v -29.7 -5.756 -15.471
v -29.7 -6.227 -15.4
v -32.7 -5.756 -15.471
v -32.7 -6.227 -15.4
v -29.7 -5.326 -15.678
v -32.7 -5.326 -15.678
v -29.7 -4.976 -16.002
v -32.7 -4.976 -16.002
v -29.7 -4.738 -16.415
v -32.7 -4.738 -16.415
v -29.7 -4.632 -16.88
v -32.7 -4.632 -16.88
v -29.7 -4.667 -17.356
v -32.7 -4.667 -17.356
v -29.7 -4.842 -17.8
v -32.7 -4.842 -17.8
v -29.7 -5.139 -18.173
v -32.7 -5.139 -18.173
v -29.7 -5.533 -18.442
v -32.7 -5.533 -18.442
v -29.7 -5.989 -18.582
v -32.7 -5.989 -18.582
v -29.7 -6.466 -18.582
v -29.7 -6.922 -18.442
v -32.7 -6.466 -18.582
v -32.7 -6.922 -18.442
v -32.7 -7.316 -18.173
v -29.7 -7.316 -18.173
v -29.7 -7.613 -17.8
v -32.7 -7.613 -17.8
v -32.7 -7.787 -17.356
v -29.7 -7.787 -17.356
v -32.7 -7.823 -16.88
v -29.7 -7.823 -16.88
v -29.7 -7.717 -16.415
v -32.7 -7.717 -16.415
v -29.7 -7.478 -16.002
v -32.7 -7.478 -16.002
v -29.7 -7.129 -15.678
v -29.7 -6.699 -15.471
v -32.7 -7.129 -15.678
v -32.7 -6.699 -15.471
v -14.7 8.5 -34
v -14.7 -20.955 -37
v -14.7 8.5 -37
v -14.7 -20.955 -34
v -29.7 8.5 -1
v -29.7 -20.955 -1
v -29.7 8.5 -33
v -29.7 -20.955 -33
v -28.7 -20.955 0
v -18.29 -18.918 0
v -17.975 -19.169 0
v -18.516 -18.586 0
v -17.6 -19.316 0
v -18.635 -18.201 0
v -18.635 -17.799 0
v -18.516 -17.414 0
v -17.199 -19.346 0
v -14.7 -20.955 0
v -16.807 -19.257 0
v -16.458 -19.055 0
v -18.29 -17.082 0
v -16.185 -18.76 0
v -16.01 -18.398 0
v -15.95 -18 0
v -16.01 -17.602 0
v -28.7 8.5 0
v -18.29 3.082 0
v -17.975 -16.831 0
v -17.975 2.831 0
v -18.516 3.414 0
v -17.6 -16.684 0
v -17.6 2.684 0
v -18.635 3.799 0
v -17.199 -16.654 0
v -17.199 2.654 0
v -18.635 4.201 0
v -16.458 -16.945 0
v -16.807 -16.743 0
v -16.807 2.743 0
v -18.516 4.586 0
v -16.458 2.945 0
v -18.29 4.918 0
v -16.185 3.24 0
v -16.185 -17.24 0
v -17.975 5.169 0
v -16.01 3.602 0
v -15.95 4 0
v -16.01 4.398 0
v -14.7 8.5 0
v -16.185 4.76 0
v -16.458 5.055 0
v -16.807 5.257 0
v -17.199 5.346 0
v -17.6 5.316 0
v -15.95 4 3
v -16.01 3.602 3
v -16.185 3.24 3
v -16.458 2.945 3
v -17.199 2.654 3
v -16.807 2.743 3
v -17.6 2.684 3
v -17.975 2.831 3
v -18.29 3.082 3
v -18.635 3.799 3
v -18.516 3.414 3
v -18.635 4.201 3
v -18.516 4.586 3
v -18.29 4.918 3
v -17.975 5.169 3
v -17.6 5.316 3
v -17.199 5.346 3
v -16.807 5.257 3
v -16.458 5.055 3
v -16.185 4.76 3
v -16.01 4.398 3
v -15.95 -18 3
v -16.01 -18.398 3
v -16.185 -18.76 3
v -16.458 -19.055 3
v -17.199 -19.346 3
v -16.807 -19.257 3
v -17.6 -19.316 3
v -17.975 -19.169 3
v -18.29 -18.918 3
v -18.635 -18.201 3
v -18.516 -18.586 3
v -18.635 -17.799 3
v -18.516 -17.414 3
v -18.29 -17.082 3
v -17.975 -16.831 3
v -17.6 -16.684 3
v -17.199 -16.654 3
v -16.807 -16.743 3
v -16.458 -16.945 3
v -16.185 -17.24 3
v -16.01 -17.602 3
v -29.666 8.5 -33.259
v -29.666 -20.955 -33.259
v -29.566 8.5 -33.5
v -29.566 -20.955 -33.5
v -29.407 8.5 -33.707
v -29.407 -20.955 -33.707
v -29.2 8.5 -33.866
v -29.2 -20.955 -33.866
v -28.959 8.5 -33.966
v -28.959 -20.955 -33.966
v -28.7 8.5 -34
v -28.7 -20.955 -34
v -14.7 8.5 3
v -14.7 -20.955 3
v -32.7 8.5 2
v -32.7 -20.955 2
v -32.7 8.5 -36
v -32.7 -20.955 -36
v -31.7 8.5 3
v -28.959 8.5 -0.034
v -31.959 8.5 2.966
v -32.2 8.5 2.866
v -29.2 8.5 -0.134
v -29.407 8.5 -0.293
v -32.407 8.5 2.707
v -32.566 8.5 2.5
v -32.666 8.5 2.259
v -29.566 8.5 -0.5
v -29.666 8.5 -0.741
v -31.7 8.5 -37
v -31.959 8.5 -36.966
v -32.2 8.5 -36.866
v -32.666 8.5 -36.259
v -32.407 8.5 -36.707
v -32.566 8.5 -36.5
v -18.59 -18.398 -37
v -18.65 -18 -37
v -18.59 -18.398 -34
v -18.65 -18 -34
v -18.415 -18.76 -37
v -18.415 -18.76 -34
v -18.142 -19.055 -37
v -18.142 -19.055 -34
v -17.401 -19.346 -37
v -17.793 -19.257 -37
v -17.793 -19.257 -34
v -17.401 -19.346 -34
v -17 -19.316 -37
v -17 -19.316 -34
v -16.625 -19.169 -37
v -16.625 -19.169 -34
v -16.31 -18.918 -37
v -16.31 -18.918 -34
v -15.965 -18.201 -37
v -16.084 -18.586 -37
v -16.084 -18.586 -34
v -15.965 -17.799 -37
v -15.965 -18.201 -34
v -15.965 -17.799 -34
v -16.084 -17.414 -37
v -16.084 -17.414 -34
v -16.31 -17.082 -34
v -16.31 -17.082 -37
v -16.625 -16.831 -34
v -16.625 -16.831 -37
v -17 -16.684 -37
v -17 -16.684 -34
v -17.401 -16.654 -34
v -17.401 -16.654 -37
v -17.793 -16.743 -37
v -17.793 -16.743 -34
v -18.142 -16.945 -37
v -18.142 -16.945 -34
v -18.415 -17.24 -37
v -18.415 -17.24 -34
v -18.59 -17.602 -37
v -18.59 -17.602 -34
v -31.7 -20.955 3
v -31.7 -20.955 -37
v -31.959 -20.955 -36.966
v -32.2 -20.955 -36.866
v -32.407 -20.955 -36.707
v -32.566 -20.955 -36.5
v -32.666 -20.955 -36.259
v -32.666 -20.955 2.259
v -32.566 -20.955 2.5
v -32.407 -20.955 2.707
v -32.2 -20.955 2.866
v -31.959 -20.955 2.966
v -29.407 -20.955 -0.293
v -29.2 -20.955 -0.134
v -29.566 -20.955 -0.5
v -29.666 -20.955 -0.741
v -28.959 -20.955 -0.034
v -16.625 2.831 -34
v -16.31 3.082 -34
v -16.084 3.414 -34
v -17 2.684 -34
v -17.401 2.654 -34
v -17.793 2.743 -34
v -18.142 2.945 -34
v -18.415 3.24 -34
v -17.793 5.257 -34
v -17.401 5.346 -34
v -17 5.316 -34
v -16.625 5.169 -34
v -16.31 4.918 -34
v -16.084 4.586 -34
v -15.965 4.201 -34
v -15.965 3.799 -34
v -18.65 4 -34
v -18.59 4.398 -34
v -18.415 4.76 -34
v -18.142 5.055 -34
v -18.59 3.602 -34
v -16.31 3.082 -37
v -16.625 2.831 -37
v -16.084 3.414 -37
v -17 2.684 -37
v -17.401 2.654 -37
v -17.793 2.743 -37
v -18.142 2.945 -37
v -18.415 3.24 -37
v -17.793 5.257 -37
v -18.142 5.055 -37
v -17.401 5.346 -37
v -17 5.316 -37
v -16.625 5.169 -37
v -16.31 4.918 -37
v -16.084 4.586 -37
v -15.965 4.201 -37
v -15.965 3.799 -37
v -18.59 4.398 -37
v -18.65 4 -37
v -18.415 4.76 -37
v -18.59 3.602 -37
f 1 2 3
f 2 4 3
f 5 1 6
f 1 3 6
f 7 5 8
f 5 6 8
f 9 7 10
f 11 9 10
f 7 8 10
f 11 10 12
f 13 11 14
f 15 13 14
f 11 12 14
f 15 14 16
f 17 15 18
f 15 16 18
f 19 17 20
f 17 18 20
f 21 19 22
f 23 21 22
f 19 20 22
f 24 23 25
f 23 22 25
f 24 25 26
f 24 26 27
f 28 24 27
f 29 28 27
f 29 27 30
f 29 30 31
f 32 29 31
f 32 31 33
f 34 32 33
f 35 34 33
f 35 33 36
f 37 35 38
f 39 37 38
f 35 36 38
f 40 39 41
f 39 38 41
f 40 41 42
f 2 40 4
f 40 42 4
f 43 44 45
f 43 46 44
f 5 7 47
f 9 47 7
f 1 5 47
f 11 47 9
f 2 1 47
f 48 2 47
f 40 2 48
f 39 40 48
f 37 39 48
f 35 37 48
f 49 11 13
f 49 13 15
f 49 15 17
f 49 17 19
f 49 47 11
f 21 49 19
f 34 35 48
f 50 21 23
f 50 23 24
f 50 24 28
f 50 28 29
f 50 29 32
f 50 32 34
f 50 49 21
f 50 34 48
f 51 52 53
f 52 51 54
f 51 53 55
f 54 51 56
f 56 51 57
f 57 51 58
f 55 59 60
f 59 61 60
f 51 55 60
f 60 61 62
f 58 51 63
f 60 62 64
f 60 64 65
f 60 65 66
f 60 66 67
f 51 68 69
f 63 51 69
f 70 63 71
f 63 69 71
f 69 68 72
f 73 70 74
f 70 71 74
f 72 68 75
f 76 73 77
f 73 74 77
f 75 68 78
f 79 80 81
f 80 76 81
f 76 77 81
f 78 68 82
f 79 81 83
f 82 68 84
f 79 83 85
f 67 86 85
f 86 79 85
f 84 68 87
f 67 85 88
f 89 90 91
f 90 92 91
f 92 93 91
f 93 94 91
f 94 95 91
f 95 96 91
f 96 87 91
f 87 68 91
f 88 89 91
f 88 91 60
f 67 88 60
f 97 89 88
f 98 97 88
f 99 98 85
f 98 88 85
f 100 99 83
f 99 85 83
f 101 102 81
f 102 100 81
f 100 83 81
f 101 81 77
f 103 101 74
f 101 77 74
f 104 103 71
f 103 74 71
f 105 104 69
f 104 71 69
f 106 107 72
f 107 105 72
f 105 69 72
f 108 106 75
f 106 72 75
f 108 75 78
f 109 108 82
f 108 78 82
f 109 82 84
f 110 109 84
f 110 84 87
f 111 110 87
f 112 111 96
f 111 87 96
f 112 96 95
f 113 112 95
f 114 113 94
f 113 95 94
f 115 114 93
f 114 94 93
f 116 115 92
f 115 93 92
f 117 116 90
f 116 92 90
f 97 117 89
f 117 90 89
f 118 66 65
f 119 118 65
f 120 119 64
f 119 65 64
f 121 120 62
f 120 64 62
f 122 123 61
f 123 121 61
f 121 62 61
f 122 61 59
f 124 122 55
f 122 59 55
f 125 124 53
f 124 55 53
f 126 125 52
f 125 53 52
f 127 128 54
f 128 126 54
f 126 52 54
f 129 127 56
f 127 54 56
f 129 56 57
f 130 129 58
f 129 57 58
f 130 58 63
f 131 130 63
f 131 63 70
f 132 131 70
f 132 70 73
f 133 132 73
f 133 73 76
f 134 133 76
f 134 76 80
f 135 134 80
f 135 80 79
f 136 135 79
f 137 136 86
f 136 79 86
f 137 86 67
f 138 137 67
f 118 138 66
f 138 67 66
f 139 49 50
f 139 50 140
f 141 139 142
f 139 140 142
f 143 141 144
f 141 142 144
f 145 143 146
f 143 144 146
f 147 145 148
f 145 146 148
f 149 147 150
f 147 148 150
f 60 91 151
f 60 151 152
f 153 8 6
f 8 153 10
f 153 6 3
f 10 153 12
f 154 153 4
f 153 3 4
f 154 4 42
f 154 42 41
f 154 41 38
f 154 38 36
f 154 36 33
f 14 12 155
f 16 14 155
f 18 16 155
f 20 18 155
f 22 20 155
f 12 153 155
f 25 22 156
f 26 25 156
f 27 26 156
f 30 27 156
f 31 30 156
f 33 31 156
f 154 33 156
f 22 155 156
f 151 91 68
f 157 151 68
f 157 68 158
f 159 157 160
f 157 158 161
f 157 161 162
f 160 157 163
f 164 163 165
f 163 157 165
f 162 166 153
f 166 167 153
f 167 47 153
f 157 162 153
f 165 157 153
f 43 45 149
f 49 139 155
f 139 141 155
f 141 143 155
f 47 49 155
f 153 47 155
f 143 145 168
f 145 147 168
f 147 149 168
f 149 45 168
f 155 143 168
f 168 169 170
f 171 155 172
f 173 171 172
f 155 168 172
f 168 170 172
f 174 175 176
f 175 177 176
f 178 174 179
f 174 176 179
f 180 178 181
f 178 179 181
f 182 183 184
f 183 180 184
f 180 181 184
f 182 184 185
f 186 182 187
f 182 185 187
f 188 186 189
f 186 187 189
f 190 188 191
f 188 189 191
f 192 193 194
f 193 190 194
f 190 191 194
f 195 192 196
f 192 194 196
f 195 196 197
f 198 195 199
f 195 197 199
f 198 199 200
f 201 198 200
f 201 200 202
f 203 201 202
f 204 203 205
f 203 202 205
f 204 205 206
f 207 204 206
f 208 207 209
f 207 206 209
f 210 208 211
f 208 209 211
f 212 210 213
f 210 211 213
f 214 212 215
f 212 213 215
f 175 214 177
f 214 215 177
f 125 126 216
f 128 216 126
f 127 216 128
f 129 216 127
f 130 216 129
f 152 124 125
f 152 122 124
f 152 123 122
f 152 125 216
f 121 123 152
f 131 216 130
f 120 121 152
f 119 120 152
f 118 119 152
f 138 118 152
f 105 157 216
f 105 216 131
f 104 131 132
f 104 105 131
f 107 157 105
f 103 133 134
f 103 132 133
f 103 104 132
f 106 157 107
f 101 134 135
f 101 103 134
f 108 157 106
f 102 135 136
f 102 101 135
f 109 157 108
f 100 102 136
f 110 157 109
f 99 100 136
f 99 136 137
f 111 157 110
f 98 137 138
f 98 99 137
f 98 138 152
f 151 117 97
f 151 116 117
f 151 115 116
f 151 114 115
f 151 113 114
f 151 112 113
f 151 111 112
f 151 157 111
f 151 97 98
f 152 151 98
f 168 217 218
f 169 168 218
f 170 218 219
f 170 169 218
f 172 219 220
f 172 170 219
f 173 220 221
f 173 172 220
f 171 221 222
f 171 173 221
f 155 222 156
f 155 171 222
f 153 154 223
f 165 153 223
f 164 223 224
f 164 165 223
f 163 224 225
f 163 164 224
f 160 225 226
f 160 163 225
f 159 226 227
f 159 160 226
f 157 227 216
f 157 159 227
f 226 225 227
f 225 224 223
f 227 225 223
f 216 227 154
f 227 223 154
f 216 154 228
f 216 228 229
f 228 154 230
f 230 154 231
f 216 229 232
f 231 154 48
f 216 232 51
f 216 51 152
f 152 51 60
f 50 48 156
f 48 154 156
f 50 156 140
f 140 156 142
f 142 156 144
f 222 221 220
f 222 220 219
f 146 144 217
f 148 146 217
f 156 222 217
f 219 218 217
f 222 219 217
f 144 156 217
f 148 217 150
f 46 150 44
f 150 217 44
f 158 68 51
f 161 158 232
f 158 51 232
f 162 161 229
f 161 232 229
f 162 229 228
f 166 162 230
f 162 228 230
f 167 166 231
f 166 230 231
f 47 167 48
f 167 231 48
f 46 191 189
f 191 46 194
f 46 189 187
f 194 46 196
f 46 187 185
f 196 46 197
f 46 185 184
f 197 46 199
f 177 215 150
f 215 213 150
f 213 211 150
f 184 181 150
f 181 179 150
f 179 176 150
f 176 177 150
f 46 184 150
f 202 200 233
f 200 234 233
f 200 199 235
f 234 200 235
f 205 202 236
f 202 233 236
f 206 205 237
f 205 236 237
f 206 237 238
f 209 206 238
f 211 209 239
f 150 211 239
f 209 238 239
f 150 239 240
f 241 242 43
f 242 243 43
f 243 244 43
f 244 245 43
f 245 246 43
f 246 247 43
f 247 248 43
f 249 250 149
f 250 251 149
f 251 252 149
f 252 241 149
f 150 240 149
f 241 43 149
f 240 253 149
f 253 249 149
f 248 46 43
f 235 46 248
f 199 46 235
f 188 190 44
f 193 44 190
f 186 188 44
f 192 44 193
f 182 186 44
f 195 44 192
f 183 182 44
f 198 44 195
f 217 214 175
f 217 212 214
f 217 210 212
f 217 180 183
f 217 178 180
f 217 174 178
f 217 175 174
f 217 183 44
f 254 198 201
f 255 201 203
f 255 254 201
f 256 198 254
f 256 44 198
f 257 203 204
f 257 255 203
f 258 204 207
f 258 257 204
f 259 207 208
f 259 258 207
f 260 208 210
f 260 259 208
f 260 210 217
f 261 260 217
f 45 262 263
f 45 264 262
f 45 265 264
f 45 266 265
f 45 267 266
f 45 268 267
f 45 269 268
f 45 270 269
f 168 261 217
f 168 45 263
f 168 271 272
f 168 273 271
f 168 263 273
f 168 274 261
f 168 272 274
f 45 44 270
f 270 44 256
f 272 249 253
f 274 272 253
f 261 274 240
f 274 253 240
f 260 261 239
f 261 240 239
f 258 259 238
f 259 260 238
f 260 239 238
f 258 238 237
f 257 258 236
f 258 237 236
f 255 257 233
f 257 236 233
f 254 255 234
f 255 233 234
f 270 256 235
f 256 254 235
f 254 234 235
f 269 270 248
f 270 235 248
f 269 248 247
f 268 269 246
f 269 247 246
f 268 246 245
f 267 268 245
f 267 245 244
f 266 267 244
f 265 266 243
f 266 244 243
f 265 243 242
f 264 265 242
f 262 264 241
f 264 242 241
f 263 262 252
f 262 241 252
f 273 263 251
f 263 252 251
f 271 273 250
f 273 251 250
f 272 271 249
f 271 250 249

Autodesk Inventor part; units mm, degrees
ref_plane "YZ Plane" through (0, 0, 0) normal (1, 0, 0) x (0, 1, 0)
ref_plane "XZ Plane" through (0, 0, 0) normal (0, 1, 0) x (-1, 0, 0)
ref_plane "XY Plane" through (0, 0, 0) normal (0, 0, 1) x (1, 0, 0)
ref_plane "작업 평면1" through (0, 0, -34) normal (0, 0, -1) x (-1, 0, 0)
sketch "스케치1" plane through (0, 0, -34) normal (0, 0, -1) x (-1, 0, 0)
  circle A0 centre (17.3, -18) radius 1.35 projected
  line L0 (20.1, -44.6) -> (20.1, 8.5) projected
  line L1 (14.5, -42) -> (14.5, 11.5) projected
  circle A1 centre (17.3, 4) radius 1.35 projected
  circle A2 centre (17.3, -18) radius 1.45
  circle A3 centre (17.3, 4) radius 1.45
  line L2 (14.7, -42) -> (14.7, 11.5)
  line L3 (14.7, 11.5) -> (20.1, 8.5)
  line L4 (14.7, -20.9546) -> (32.7, -20.9546)
  line L5 (32.7, -20.9546) -> (32.7, 8.5)
  line L6 (32.7, 8.5) -> (20.1, 8.5)
  line L7 (32.7, -20.9546) -> (26.7, -20.9546)
  line L8 (26.7, -20.9546) -> (26.7, 8.5)
  line L9 (26.7, 8.5) -> (32.7, 8.5)
  line L10 (32.7, 8.5) -> (32.7, -20.9546)
  line L11 (20.1, 8.5) -> (14.7, 8.5)
  point P0 (0, 0)
  dimension "d0" = 0.1
  dimension "d1" = 0.1
  dimension "d2" = 0.2
  dimension "d3" = 18
  dimension "d8" = 6
extrude "돌출1" add sketch "스케치1" along normal blind 3 contours L4 L2 L11 L0 | L0 L6 L8 L4 | L8 L6 L5 L4 | A2 | A3
sketch "스케치2" plane through (0, 0, -34) normal (0, 0, 1) x (1, 0, 0)
  line L0 (-20.1, 8.5) -> (-14.7, 11.5) projected
  line L1 (-14.7, 8.5) -> (-14.7, -20.9546) projected
  line L2 (-20.1, -44.6) -> (-20.1, 8.5) projected
  line L3 (-32.7, 8.5) -> (-14.7, 8.5) projected
  line L4 (-32.7, -20.9546) -> (-32.7, 8.5) projected
  line L5 (-14.7, -20.9546) -> (-32.7, -20.9546) projected
  line L6 (-20.1, -20.9546) -> (-32.7, -20.9546)
  line L7 (-32.7, -20.9546) -> (-32.7, 8.5)
  line L8 (-32.7, 8.5) -> (-20.1, 8.5)
  line L9 (-20.1, 8.5) -> (-20.1, -20.9546)
  line L10 (-20.1, -20.9546) -> (-14.7, -20.9546)
  line L11 (-14.7, 11.5) -> (-20.1, 8.5)
  circle A0 centre (-17.3, -18) radius 1.45 projected
  circle A1 centre (-17.3, 4) radius 1.35 projected
  circle A2 centre (-17.3, 4) radius 1.45 projected
  circle A3 centre (-17.3, 4) radius 1.45
  circle A4 centre (-17.3, -18) radius 1.45
  point P0 (0, 0)
ref_plane "작업 평면2" through (0, 0, 0) normal (0, 0, 1) x (1, 0, 0)
sketch "스케치3" plane through (0, 0, 0) normal (0, 0, 1) x (1, 0, 0)
  line L0 (-32.7, 8.5) -> (-14.7, 8.5) projected
  line L1 (-32.7, -20.9546) -> (-32.7, 8.5) projected
  line L2 (-14.7, -20.9546) -> (-32.7, -20.9546) projected
  line L3 (-14.7, 8.5) -> (-14.7, -20.9546) projected
  line L4 (-20.1, -20.9546) -> (-32.7, -20.9546)
  line L5 (-32.7, -20.9546) -> (-32.7, 8.5)
  line L6 (-32.7, 8.5) -> (-20.1, 8.5)
  line L7 (-20.1, 8.5) -> (-20.1, -20.9546)
  line L8 (-32.7, -20.9546) -> (-20.1, -20.9546)
  line L9 (-20.1, -20.9546) -> (-20.1, 8.5)
  line L10 (-20.1, 8.5) -> (-32.7, 8.5)
  line L11 (-32.7, 8.5) -> (-32.7, -20.9546)
  line L12 (-20.1, -20.9546) -> (-14.7, -20.9546)
  line L13 (-14.7, 8.5) -> (-14.7, -20.9546) projected
  line L14 (-14.7, 11.5) -> (-20.1, 8.5)
  circle A0 centre (-17.3, -18) radius 1.45
  circle A1 centre (-17.3, 4) radius 1.45
  circle A2 centre (-17.3, 4) radius 1.35 projected
  circle A3 centre (-17.3, 4) radius 1.35
  circle A4 centre (-17.3, -18) radius 1.35
  point P0 (0, 0)
  dimension "d25" = 2.7
  dimension "d26" = 2.7
extrude "돌출2" add sketch "스케치3" along normal blind 3 contours L0 L7 L2 L1 | L0 L3 L2 L7 | A0 | A1
sketch "스케치4" plane through (0, 0, -34) normal (0, 0, 1) x (1, 0, 0)
  line L0 (-14.7, -20.9546) -> (-14.7, 8.5) projected
  line L1 (-14.7, 8.5) -> (-32.7, 8.5) projected
  line L2 (-32.7, 8.5) -> (-32.7, -20.9546) projected
  line L3 (-32.7, -20.9546) -> (-14.7, -20.9546) projected
  line L4 (-32.7, 8.5) -> (-26.7, 8.5)
  line L5 (-26.7, -20.9546) -> (-32.7, -20.9546)
  line L6 (-32.7, -20.9546) -> (-32.7, 8.5)
  line L7 (-32.7, 8.5) -> (-29.7, 8.5)
  line L8 (-29.7, 8.5) -> (-29.7, -20.9546)
  line L9 (-29.7, -20.9546) -> (-32.7, -20.9546)
  line L10 (-32.7, -20.9546) -> (-32.7, 8.5)
  point P0 (0, 0)
  point P1 (-29.7, -20.9546)
  dimension "d9" = 6
  dimension "d23" = 3
extrude "돌출3" add sketch "스케치4" along normal up to surface (34 mm away) contours L3 L2 L1 L8
sketch "스케치6" plane through (-32.7, -20.9546, -37) normal (-1, 0, 0) x (0, 0, 1)
  line L0 (40, 29.4546) -> (0, 29.4546) projected
  line L1 (0, 0) -> (0, 29.4546) projected
  line L2 (0, 0) -> (40, 0) projected
  line L3 (40, 29.4546) -> (40, 0) projected
  circle A0 centre (20, 14.7273) radius 1.6
  point P0 (37, 20.9546)
  dimension "d24" = 3.2
extrude "돌출5" cut sketch "스케치6" against normal blind 10 contours A0
fillet "모깎기1" radius 1 4 edges at (-32.7, -6.2273, 3) (-32.7, -6.2273, -37) (-29.7, -6.2273, -34) (-29.7, -6.2273, 0)
properties part number "3D_ankle1" material "PMMA 플라스틱"
